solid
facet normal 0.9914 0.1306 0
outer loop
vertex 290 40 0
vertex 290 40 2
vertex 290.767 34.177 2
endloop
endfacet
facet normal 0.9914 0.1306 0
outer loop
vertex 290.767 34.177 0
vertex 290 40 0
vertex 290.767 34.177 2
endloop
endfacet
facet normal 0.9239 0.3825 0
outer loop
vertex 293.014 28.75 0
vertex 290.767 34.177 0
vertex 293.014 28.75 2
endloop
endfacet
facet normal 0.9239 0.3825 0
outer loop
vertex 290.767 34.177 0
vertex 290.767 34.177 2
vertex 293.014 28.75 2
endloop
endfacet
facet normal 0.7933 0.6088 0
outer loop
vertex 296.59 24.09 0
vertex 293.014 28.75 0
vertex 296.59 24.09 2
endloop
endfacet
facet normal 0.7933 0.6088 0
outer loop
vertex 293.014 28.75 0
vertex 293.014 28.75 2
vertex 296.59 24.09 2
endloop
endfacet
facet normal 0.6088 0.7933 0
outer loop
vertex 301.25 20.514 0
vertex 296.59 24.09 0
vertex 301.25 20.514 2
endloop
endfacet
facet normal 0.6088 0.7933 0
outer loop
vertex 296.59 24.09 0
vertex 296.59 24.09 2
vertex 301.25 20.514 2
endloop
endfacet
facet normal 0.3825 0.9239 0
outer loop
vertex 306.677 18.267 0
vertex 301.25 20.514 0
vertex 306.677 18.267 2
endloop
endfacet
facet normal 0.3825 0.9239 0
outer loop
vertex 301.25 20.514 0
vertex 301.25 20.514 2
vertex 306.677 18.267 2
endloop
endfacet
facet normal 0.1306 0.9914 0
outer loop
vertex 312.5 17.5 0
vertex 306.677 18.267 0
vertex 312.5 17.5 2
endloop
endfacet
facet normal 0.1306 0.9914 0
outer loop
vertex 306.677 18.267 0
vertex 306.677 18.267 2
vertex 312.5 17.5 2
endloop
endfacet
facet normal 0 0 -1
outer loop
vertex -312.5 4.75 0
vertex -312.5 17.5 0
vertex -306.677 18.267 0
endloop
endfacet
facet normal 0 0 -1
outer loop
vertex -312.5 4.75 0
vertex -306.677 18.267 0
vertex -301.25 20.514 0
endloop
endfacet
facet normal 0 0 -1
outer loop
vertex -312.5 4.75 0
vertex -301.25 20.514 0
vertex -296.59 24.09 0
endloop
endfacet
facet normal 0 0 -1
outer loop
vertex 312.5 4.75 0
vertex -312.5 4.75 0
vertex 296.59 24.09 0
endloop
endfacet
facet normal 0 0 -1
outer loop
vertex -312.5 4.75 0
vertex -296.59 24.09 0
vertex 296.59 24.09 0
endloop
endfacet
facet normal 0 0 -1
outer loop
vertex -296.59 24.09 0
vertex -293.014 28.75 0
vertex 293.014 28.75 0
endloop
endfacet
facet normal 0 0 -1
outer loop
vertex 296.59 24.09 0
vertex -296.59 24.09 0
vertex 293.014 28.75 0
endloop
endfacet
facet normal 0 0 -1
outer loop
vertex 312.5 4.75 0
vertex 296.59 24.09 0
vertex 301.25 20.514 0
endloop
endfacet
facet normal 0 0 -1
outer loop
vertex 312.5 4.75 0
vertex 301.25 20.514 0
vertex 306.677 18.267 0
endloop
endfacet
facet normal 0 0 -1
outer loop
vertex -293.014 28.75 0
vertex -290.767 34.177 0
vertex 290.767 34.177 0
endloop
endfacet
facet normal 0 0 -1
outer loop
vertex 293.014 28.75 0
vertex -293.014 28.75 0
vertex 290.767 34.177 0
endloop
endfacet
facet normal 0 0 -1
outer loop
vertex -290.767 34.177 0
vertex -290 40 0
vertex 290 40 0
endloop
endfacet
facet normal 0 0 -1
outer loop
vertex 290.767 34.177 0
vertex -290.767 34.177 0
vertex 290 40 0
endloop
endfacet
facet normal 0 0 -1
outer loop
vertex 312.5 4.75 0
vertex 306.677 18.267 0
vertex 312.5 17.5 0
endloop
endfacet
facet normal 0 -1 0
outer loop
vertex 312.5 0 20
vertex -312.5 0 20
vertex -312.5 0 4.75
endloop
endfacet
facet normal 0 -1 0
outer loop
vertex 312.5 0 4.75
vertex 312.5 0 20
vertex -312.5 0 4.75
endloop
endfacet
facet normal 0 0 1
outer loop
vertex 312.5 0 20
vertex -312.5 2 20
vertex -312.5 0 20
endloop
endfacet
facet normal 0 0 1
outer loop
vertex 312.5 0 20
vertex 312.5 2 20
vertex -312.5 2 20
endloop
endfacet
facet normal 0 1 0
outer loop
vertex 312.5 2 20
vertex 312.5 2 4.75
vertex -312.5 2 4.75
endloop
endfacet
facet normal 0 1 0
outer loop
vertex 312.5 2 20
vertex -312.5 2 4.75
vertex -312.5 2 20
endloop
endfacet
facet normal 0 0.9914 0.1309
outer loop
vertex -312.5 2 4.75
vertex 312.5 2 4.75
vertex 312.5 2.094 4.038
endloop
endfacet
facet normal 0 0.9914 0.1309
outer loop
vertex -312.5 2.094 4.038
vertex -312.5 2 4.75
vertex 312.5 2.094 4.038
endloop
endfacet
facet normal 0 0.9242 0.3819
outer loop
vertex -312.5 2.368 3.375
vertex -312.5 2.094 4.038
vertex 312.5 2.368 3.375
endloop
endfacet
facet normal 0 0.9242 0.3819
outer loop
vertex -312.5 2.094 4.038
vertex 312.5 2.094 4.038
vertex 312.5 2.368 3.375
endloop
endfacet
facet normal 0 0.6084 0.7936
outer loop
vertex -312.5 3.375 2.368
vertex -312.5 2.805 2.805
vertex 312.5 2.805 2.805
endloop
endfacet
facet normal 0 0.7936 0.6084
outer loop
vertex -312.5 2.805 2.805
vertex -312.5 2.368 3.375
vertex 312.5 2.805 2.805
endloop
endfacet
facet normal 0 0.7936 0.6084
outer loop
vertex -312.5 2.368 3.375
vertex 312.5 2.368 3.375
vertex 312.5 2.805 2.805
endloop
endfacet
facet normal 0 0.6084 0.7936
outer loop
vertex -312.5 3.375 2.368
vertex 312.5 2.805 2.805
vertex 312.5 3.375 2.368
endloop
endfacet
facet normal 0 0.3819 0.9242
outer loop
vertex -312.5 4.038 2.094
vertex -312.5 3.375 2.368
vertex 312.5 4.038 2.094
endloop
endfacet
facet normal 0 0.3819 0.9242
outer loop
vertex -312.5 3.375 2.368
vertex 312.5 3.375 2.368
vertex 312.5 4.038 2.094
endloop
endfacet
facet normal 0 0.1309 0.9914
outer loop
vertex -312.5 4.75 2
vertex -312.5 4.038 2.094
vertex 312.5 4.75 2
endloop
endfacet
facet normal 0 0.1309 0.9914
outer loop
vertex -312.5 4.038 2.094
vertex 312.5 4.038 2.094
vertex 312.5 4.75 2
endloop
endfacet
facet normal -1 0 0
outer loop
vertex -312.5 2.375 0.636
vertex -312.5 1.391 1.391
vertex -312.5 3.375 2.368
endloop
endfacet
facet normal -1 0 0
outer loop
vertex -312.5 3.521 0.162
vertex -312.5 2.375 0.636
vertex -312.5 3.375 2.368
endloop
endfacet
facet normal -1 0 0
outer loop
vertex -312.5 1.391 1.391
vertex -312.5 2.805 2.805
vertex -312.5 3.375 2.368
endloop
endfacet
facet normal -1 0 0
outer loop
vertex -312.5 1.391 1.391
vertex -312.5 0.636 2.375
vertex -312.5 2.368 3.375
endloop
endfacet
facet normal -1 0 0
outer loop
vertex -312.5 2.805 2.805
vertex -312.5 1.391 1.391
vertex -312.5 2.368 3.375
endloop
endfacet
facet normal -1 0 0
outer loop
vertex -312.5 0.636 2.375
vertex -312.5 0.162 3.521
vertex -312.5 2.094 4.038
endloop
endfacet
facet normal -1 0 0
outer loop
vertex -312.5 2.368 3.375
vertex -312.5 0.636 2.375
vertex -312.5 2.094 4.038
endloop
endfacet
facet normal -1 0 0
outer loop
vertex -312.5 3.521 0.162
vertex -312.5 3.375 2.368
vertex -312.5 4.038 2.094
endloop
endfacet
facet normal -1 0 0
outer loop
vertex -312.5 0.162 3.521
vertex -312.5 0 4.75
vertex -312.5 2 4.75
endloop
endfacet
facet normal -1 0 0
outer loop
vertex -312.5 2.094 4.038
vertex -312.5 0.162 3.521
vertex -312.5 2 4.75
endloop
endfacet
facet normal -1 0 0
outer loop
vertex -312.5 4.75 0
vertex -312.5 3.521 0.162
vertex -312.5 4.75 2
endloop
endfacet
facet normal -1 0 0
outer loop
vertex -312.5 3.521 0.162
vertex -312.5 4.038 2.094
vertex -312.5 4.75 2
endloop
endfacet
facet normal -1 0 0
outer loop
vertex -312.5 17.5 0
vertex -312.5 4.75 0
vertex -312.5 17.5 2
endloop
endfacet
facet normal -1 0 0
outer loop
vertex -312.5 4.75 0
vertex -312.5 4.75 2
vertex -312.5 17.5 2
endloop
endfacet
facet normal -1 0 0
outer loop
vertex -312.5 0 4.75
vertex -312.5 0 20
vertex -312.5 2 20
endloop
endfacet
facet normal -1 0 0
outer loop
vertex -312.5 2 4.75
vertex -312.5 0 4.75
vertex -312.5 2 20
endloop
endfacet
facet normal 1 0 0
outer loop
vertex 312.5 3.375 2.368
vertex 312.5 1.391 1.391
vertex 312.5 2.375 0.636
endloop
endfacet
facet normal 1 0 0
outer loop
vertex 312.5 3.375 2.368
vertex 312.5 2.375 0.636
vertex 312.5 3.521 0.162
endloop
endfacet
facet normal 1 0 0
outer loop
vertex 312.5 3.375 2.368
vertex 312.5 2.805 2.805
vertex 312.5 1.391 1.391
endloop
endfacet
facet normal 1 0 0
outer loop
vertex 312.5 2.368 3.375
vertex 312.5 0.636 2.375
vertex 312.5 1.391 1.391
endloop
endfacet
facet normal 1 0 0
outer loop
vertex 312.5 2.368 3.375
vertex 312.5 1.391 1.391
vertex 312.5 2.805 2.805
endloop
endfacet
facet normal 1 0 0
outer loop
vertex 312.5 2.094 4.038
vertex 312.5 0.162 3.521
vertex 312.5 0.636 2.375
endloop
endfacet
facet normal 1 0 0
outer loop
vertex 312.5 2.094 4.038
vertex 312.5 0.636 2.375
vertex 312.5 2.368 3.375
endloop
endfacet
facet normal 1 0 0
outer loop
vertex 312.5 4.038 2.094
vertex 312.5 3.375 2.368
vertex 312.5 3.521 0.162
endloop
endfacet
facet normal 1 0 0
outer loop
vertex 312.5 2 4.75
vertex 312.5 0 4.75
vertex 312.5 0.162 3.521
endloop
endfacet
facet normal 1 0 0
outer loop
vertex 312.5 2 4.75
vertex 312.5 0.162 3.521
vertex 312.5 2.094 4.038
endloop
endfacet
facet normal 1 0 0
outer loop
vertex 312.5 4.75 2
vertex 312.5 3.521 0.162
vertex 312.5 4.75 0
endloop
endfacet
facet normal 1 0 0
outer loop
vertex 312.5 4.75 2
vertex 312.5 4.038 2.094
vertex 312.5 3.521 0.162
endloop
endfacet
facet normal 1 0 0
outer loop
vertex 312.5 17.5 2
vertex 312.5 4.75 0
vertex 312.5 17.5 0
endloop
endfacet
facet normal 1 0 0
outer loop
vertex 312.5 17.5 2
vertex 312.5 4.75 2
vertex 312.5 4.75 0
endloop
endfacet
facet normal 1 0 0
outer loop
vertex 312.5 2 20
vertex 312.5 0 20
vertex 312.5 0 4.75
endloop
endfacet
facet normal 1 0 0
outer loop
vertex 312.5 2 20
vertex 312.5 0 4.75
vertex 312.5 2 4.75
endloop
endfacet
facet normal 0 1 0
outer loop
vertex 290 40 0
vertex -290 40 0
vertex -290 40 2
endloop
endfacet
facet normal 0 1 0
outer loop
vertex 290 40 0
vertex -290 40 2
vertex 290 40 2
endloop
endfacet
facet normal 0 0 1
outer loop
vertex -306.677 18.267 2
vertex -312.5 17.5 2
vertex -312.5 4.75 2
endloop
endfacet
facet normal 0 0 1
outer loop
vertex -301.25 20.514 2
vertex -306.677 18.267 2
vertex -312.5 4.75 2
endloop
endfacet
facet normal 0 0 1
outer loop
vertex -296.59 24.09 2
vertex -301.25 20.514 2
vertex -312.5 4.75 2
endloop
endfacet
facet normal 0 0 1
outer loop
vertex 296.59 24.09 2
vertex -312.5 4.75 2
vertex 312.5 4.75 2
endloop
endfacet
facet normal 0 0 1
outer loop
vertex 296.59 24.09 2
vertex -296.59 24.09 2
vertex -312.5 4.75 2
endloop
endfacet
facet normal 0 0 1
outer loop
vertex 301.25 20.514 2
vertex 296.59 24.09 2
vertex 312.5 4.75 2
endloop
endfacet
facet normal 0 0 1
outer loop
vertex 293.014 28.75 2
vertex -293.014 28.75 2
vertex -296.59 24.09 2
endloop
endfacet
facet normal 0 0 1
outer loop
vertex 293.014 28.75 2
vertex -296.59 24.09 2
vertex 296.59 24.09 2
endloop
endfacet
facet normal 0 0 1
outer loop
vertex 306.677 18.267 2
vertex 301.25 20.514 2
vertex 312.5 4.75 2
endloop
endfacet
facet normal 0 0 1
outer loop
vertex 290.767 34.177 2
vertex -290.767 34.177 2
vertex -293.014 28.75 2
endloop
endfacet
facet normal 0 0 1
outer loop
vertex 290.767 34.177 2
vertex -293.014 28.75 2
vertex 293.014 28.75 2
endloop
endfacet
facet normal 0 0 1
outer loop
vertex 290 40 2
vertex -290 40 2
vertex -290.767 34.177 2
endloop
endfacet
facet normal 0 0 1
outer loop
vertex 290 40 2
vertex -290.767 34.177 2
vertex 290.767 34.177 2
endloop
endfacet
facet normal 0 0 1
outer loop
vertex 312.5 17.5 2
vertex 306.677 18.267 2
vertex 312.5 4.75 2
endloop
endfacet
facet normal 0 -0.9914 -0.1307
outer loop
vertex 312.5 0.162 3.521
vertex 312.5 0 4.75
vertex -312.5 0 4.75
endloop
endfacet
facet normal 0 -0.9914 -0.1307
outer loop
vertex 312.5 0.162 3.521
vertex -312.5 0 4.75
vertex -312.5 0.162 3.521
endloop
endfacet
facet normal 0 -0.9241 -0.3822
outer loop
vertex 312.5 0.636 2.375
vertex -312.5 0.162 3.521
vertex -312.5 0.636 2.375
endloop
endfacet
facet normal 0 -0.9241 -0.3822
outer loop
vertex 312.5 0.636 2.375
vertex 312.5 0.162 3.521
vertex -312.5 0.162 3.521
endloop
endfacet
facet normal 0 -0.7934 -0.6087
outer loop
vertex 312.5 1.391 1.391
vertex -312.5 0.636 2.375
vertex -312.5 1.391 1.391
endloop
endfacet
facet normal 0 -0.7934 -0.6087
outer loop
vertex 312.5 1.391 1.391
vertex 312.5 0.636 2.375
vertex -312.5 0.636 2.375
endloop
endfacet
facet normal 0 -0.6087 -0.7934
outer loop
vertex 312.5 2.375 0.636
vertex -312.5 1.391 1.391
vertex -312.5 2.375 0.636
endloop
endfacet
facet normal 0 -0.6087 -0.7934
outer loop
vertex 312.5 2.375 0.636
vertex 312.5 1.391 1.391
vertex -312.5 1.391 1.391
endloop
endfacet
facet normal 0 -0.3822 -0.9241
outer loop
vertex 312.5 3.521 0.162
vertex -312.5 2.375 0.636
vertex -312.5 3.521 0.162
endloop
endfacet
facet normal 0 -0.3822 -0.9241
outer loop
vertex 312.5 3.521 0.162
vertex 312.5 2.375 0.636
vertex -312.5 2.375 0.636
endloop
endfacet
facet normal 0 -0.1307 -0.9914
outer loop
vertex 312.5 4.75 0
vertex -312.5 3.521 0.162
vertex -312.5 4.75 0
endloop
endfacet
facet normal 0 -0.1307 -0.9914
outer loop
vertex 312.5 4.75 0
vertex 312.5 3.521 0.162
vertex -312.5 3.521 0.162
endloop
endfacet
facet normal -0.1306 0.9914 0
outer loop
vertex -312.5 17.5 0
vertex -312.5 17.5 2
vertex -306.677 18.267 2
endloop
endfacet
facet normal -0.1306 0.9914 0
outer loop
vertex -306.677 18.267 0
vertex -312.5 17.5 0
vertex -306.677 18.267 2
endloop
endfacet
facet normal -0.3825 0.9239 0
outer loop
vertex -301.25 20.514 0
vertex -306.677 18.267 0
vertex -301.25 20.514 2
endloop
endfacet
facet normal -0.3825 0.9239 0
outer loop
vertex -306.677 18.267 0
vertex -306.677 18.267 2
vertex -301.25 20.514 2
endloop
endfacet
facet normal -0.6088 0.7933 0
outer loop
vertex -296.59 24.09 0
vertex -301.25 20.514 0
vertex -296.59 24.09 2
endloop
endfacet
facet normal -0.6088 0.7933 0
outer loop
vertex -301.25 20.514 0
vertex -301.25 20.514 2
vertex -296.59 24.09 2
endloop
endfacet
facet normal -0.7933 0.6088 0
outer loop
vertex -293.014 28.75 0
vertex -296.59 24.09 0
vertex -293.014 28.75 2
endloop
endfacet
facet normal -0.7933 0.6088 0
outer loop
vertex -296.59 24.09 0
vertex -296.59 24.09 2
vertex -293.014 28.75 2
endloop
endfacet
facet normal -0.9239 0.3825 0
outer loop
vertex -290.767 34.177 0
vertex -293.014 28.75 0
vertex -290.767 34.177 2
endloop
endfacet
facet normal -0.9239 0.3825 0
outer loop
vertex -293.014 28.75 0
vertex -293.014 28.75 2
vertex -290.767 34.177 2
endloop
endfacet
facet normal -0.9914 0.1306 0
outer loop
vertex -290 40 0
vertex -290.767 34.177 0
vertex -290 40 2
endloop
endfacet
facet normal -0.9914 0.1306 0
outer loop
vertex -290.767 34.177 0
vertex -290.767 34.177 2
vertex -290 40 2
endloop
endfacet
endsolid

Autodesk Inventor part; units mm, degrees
ref_plane "YZ Plane" through (0, 0, 0) normal (1, 0, 0) x (0, 1, 0)
ref_plane "XZ Plane" through (0, 0, 0) normal (0, 1, 0) x (-1, 0, 0)
ref_plane "XY Plane" through (0, 0, 0) normal (0, 0, 1) x (1, 0, 0)
sketch "Sketch1" plane through (0, 0, 0) normal (0, 0, 1) x (1, 0, 0)
  line L0 (-312.5, 40) -> (312.5, 40)
  line L1 (312.5, 40) -> (312.5, 0)
  line L2 (312.5, 0) -> (-312.5, 0)
  line L3 (-312.5, 0) -> (-312.5, 40)
  point P0 (0, 0)
  point P1 (0, 0)
  dimension "d1" = 40
  dimension "d45" = 625
extrude "Plate1" add sketch "Sketch1" along normal blind 2
sketch "Sketch2" plane through (312.5, 2, 0) normal (0, -1, 0) x (1, 0, 0)
  line L0 (-625, 0) -> (0, 0)
  line L1 (0, 0) -> (0, 20)
  line L2 (0, 20) -> (-625, 20)
  line L3 (-625, 20) -> (-625, 0)
edge flange "Flange1" height 20 angle 90 thickness 2 bend radius 2.75 thickness toward (0, -1, 0) relief round relief width 2 relief depth 1 edges at (0, 0, 2) wall of the first edge with corners at (-312.5, 2, 0) (312.5, 2, 0) (312.5, 2, 20) (-312.5, 2, 20)
bend "Bend1"
corner "Corner1"
sketch "Sketch6" plane through (0, 0, 0) normal (0, 0, -1) x (-1, 0, 0)
  line L0 (-312.5, 40) -> (-312.5, 4.75) projected
  circle A0 centre (-312.5, 40) radius 22.5
  line L1 (-312.5, 40) -> (312.5, 40) projected
  line L2 (-499, 30) -> (-499, 67.6691) projected
  point P0 (0, 0)
  point P1 (-290, 40)
  point P2 (-312.5, 17.5)
  point P3 (312.5, 40)
  dimension "d24" = 45
extrude "Extrusion2" cut sketch "Sketch6" along normal mid plane 30 contours L1 A0 L0 picked at (-297.688, 38.3311)
sketch "Sketch9" plane through (0, 0, 2) normal (0, 0, 1) x (1, 0, 0)
  line L0 (95.482, 35) -> (95.482, 23) construction
  line L1 (95.482, 23) -> (-104.518, 23) construction
  line L2 (-104.518, 23) -> (-104.518, 35) construction
  line L3 (-104.518, 35) -> (95.482, 35) construction
  line L4 (-312.5, 40) -> (312.5, 40) projected
  point P0 (0, 0)
  dimension "d40" = 200
  dimension "d41" = 12
  dimension "d43" = 5
mark "Mark2"
mirror "Mirror3" about plane through (0, 0, 0) normal (1, 0, 0) of "Extrusion2"
equation "\"d43\" = d42"
equation "\"d2\" = Thickness"
equation "\"d3\" = BendReliefWidth"
equation "\"d4\" = BendReliefDepth"
equation "\"d5\" = MinimumRemnant"
equation "\"d6\" = TransitionRadius"
equation "\"d9\" = BendRadius"
equation "\"d10\" = CornerReliefSize"
equation "\"d11\" = GapSize"
equation "\"d12\" = JacobiRadiusSize"
equation "\"GapSize\" = Thickness"
equation "\"MinimumRemnant\" = 2 * Thickness"
equation "\"BendReliefDepth\" = 0.5 * Thickness"
equation "\"BendReliefWidth\" = Thickness"
equation "\"CornerReliefSize\" = 4 * Thickness"
equation "\"JacobiRadiusSize\" = BendRadius"
equation "\"TransitionRadius\" = BendRadius"
equation "\"qqqqqq\" = 67.35706"
equation "\"d42\" = 5"
equation "\"Thickness\" = 2"
equation "\"BendRadius\" = 2.75"
properties part number "MSC 408 STRINGER LOWERBACK" material "Stainless Steel"
